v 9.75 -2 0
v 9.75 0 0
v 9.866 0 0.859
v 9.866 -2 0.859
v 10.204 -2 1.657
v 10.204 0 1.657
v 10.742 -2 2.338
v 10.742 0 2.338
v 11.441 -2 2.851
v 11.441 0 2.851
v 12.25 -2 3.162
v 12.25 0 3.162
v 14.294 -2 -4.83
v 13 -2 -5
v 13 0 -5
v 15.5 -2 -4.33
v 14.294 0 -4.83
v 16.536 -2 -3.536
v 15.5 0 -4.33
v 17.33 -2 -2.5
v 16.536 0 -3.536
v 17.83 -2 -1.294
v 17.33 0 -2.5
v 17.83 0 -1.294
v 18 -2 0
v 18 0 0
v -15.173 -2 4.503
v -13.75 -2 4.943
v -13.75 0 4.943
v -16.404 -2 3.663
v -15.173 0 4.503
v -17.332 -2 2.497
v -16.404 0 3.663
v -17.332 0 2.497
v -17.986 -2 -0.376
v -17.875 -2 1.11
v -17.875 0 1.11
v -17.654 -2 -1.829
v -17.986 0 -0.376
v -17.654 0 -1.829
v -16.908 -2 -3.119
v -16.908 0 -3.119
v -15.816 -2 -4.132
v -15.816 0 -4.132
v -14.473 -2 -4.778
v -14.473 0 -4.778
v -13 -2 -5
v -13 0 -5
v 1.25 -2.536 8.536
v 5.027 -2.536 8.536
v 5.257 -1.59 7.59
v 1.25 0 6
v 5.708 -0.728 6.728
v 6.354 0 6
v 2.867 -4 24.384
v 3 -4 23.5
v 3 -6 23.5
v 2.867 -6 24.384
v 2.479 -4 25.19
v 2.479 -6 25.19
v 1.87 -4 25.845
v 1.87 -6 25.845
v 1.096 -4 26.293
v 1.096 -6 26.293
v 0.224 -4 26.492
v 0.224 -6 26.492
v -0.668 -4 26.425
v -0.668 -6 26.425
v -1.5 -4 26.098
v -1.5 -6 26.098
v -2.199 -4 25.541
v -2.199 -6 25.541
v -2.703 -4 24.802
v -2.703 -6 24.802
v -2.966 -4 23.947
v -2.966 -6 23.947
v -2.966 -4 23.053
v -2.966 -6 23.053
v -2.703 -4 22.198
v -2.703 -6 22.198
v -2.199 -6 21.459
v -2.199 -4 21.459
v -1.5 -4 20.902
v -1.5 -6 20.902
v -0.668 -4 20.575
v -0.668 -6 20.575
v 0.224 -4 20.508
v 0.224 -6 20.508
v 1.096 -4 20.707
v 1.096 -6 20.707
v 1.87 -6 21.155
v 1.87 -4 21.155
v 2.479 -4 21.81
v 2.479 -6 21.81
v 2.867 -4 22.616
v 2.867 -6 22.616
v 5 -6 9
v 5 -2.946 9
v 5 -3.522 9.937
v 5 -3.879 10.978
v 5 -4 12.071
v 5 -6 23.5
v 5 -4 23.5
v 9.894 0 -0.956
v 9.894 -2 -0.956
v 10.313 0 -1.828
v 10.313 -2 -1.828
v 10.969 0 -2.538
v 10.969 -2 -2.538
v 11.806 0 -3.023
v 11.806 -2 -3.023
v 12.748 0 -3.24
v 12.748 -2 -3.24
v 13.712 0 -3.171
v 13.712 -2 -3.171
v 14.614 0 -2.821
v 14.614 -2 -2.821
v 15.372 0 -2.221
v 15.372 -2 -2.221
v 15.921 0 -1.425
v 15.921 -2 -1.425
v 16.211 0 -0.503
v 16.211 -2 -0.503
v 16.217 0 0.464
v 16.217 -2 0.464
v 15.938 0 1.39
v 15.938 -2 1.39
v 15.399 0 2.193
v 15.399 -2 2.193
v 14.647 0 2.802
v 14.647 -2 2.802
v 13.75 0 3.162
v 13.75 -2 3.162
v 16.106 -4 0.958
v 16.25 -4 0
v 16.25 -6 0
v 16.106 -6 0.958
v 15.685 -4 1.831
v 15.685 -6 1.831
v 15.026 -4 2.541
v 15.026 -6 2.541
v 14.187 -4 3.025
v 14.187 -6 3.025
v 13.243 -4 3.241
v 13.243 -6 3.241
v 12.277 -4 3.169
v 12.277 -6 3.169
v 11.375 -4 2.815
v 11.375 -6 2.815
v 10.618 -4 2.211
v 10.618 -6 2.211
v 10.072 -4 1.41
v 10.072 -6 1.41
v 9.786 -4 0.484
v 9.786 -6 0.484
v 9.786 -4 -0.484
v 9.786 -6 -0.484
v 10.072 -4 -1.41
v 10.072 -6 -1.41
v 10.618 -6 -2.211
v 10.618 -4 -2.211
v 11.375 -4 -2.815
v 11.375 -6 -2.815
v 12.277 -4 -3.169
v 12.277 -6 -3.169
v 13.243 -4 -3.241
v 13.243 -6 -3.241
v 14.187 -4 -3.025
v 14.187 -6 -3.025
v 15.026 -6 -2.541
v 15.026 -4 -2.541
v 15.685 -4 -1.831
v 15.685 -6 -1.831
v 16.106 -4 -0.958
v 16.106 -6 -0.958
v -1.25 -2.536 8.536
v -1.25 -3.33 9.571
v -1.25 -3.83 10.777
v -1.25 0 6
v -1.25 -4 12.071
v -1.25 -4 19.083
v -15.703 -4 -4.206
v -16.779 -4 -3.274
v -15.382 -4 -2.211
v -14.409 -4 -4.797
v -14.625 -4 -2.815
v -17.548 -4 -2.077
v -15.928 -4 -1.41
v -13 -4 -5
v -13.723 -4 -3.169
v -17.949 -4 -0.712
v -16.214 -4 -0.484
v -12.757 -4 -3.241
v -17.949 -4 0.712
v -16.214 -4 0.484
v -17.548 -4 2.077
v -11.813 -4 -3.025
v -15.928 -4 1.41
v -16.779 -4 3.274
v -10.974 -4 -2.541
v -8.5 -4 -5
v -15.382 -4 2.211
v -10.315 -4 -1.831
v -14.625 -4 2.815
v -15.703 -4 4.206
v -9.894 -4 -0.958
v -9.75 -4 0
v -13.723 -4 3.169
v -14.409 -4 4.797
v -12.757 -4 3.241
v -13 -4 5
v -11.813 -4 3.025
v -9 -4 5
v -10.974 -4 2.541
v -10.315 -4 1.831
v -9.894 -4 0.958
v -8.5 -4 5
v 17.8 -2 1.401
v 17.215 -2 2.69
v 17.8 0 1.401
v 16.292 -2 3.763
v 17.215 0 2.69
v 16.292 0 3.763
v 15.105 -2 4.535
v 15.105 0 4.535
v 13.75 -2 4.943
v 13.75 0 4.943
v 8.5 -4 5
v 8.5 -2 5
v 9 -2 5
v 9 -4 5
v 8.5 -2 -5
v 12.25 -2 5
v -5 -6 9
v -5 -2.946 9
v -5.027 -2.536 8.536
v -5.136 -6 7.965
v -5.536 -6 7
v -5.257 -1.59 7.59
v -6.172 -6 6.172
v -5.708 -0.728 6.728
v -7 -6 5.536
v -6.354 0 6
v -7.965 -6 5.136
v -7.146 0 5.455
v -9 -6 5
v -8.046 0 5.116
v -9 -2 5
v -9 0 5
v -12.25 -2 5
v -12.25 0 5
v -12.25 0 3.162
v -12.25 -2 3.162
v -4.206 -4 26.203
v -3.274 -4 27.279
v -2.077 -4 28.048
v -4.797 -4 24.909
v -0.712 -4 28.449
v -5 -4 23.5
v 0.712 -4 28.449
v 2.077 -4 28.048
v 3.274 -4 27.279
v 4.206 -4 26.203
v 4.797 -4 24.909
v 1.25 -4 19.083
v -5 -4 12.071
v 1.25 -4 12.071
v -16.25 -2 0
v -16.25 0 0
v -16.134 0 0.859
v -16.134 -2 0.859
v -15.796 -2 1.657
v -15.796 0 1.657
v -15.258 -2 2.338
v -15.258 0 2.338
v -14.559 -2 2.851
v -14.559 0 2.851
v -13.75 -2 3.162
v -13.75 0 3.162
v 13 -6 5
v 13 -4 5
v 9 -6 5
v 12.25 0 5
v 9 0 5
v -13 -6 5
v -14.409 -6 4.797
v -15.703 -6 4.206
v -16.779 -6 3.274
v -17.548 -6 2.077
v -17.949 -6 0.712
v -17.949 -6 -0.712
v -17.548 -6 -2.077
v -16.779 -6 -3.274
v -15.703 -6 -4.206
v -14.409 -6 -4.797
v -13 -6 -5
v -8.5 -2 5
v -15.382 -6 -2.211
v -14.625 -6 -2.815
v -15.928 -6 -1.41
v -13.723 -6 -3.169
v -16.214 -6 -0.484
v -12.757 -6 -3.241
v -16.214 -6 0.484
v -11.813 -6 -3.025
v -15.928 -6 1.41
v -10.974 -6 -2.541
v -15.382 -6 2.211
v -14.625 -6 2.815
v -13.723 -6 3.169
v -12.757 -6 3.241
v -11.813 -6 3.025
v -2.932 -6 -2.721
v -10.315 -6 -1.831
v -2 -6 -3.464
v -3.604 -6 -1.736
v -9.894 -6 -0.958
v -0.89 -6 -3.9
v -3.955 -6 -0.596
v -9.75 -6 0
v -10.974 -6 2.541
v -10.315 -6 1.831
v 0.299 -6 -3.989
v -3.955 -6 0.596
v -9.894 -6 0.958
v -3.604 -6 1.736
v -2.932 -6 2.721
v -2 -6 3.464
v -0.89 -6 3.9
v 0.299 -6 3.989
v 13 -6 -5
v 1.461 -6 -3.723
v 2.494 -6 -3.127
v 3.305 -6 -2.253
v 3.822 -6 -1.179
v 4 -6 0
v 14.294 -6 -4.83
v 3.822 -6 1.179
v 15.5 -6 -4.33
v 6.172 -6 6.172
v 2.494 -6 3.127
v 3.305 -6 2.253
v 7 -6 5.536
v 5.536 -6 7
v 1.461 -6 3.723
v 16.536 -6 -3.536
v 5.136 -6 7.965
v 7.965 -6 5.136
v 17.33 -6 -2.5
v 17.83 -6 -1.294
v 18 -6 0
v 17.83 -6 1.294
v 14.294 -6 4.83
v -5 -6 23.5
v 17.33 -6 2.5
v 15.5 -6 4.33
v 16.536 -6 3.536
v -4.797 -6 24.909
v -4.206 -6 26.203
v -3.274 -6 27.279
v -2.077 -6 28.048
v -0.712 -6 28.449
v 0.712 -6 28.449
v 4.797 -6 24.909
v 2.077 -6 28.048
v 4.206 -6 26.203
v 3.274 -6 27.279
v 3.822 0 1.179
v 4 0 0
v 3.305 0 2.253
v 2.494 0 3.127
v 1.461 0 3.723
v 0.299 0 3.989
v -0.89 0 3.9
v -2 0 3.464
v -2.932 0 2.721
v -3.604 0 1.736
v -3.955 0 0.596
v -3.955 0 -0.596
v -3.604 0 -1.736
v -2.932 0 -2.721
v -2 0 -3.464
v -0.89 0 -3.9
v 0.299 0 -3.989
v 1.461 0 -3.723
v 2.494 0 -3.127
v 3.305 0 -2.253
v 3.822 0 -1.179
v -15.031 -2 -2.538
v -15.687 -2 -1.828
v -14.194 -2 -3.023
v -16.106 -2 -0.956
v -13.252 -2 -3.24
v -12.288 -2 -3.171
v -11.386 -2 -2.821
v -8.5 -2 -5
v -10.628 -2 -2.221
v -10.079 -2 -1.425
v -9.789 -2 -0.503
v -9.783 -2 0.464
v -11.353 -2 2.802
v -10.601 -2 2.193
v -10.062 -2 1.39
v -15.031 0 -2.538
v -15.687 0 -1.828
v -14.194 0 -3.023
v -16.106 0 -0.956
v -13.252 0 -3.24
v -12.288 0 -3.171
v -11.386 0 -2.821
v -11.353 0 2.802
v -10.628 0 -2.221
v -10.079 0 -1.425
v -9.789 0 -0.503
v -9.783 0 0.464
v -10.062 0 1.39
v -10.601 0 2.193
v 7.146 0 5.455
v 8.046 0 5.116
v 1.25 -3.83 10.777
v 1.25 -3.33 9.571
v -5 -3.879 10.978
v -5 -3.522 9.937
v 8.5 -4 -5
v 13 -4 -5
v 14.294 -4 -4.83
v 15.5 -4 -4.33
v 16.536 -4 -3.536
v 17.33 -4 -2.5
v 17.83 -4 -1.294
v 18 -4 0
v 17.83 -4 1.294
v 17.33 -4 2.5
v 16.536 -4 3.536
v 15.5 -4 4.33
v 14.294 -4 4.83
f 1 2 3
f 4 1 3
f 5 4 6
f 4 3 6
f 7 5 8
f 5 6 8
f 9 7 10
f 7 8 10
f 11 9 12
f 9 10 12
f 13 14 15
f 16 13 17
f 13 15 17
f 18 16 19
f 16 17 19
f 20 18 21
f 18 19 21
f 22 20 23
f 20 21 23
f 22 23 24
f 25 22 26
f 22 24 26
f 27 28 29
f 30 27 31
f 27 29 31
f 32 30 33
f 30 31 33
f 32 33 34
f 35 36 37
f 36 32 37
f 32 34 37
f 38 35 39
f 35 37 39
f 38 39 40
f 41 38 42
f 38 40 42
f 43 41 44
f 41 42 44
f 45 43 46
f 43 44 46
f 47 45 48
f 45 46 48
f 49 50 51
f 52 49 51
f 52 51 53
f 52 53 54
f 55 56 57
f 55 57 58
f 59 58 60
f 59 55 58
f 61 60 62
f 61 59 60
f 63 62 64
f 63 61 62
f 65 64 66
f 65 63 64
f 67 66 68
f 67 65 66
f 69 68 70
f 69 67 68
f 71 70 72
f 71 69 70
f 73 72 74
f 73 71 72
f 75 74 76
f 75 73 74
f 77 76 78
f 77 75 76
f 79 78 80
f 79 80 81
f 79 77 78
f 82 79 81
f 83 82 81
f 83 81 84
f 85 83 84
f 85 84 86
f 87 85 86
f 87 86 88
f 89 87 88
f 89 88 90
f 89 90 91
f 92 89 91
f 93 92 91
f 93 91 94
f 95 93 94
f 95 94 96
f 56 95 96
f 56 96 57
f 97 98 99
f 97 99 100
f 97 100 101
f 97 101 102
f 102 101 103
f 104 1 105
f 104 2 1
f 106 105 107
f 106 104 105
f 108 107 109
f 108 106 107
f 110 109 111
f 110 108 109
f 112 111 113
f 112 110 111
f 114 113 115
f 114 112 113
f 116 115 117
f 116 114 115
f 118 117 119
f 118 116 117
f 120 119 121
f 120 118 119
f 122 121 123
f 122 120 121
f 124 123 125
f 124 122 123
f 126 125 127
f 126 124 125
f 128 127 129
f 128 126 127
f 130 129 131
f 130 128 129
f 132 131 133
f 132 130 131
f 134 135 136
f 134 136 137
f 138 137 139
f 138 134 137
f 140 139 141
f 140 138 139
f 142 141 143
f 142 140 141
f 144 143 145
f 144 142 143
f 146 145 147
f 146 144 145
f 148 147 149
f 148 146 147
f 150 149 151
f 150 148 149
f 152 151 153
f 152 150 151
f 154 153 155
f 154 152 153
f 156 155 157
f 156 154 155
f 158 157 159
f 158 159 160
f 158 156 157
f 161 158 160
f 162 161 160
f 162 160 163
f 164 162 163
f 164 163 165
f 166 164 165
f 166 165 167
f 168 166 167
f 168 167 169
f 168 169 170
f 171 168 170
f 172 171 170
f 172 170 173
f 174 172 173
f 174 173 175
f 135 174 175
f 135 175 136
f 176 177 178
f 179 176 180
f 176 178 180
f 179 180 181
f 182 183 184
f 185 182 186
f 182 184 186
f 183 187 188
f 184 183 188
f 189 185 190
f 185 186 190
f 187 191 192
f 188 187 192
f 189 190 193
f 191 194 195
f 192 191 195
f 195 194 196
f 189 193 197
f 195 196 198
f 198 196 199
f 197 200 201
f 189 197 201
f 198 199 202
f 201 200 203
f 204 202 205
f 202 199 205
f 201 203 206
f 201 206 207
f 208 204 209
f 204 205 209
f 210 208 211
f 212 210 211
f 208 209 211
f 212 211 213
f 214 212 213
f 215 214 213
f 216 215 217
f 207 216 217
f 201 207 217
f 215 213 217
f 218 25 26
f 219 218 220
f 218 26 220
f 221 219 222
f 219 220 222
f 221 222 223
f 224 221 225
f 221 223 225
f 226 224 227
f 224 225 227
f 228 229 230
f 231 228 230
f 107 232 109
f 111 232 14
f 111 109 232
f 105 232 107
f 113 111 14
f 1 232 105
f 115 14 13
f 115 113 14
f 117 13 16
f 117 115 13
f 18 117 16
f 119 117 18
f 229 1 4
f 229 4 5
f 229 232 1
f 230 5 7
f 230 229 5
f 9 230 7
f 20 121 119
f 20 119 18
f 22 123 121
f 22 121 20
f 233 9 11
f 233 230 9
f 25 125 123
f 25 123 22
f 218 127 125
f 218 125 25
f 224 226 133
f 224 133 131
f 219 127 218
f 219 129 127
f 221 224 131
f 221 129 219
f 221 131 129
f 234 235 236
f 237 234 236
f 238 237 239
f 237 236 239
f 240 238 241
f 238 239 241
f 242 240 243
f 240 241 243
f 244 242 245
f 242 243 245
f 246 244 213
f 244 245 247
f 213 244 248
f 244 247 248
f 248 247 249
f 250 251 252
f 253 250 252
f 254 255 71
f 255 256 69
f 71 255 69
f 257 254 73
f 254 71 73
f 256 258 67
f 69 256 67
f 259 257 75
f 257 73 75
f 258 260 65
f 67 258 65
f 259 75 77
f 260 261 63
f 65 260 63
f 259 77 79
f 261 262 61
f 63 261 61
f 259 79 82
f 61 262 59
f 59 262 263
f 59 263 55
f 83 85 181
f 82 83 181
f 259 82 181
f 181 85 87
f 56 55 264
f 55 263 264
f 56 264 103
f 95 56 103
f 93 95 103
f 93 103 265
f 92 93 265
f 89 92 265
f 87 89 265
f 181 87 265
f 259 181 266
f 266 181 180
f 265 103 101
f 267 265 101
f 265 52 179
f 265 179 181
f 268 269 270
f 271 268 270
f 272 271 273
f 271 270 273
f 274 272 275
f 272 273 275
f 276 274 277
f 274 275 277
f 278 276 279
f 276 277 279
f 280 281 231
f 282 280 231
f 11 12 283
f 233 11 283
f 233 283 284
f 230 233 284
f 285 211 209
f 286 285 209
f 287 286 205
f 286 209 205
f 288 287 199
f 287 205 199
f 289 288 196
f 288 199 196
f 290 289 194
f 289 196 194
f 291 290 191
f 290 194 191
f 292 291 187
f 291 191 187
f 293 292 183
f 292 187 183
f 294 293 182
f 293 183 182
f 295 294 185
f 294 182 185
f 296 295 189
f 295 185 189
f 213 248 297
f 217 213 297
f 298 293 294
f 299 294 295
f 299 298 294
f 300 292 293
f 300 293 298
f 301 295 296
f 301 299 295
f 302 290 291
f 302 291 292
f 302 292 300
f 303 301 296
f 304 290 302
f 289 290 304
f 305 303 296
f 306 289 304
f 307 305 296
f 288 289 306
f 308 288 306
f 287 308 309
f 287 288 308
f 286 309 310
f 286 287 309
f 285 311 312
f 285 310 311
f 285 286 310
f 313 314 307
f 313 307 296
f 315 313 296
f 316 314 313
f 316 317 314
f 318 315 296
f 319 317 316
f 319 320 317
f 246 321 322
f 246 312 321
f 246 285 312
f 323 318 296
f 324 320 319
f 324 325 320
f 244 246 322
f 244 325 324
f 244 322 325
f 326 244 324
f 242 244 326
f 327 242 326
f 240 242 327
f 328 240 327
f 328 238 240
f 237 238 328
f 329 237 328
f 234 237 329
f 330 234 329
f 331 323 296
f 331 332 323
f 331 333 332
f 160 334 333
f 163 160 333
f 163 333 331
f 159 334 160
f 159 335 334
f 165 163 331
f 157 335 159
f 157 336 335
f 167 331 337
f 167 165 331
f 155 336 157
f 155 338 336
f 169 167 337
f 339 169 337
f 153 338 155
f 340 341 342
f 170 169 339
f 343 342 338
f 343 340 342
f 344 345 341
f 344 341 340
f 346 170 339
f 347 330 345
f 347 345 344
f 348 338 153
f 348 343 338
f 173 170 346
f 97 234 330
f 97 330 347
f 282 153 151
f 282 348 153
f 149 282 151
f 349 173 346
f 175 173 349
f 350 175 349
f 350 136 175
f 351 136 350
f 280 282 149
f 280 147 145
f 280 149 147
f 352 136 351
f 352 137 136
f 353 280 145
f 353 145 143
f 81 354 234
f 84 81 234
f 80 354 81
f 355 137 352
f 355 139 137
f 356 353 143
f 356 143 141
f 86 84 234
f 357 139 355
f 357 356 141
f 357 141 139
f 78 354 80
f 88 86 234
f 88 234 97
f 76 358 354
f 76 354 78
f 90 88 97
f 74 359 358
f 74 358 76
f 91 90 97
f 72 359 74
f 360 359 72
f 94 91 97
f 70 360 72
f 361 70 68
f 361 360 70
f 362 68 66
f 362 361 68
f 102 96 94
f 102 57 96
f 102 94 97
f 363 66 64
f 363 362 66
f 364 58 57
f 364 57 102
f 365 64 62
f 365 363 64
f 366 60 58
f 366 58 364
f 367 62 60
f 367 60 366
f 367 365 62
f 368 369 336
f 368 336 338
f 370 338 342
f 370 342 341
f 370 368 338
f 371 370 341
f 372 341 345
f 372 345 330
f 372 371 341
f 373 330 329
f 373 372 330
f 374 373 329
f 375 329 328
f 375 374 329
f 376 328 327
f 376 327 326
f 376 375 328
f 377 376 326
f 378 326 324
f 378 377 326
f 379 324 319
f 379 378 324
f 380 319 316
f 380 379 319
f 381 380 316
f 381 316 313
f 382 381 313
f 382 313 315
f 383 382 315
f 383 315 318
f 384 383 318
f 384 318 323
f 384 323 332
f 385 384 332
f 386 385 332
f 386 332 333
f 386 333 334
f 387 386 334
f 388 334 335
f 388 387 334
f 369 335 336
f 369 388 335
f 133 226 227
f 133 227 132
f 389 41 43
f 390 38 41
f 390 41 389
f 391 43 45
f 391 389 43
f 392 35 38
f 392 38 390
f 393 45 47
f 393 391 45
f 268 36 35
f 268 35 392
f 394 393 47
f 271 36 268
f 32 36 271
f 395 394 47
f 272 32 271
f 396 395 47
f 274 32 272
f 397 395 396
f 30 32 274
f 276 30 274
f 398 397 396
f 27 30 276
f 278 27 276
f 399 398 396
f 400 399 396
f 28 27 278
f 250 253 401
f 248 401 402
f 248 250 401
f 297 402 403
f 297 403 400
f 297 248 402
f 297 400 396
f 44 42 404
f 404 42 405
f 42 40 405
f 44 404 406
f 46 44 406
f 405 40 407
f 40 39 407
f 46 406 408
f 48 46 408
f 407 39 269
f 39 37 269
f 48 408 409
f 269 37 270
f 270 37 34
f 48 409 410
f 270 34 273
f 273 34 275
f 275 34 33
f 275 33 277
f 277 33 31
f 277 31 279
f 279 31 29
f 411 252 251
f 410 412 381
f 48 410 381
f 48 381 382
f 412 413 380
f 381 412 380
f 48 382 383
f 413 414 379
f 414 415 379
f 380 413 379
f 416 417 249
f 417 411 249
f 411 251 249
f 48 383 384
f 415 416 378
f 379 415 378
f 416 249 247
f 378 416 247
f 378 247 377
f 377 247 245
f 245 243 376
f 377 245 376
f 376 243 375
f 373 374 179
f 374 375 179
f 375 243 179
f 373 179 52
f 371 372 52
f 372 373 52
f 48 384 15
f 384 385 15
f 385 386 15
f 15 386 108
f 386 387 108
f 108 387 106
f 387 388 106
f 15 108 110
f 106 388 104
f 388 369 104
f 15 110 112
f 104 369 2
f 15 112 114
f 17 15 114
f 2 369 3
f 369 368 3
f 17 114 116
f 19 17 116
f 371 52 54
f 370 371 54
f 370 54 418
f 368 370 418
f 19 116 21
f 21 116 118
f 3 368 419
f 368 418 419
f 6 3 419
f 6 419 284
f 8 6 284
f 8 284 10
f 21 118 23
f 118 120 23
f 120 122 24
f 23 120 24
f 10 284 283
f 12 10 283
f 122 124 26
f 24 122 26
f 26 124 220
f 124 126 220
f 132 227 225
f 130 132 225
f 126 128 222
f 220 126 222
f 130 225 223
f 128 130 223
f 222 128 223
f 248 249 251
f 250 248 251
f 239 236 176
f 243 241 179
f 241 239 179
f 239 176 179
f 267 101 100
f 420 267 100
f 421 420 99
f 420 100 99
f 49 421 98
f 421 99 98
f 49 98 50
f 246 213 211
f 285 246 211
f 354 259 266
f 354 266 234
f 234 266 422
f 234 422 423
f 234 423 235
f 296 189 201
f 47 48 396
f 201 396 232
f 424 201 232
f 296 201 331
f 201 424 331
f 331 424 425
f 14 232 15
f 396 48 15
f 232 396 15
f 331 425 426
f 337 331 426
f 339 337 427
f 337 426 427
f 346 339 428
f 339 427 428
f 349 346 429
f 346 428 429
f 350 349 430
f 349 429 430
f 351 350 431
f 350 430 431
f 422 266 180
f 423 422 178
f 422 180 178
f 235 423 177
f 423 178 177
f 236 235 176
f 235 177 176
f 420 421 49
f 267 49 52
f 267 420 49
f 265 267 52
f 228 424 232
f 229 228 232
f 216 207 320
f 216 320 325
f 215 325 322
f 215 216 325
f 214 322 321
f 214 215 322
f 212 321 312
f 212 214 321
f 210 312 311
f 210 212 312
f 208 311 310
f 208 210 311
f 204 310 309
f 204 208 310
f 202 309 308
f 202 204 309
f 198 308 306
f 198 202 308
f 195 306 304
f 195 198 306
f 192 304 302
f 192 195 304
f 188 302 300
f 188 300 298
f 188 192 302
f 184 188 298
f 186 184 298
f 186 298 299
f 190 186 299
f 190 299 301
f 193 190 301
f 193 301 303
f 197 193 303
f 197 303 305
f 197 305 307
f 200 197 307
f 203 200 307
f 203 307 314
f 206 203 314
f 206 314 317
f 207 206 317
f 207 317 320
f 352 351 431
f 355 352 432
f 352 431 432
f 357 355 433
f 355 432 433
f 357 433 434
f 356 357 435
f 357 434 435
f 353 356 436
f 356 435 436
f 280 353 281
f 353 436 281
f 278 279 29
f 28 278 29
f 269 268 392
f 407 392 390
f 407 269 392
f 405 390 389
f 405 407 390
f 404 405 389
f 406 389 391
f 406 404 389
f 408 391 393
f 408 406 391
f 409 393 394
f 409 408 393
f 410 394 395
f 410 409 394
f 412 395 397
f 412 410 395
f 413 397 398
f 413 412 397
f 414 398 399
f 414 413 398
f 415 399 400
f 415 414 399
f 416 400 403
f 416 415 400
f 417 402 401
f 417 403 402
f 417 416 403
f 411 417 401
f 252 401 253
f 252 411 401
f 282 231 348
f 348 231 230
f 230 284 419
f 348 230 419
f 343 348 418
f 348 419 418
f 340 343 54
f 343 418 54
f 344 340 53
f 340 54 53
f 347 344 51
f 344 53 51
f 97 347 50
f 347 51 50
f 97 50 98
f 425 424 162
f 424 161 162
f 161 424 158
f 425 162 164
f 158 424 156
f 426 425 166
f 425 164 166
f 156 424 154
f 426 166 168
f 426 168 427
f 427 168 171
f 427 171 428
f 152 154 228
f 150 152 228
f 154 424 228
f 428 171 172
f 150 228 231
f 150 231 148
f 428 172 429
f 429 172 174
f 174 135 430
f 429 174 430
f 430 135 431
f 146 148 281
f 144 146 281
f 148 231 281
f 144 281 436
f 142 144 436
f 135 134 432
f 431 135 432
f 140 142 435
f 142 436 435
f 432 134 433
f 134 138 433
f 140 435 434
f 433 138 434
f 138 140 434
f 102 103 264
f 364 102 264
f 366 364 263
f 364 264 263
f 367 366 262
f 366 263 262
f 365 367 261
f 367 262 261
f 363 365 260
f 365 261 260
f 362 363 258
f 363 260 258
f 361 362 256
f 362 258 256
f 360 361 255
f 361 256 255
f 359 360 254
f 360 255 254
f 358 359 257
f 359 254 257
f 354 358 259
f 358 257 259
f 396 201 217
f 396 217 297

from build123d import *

# Parameters (mm, degrees)
F0_R     = 4
F0_R_2   = 3
F0_R_3   = 3.25
F1_DEPTH = 6
F3_DEPTH = 12.5
F5_DEPTH = 1.25
F6_W     = 9.5
F6_H     = 2
F7_DEPTH = 25
F9_DEPTH = 2


with BuildPart() as f1:
    # F0 (on Front) → F1 (new body)
    with BuildSketch(Plane.XZ):
        with BuildLine():
            ThreePointArc((-13, 5), (-9.4644660941, 3.5355339059), (-8, 0))
            ThreePointArc((-8, 0), (-9.4644660941, -3.5355339059), (-13, -5))
            Line((-13, -5), (13, -5))
            ThreePointArc((13, -5), (8, 0), (13, 5))
            Line((13, 5), (9, 5))
            ThreePointArc((9, 5), (6.1715728753, 6.1715728753), (5, 9))
            Line((5, 9), (5, 23.5))
            ThreePointArc((5, 23.5), (0, 28.5), (-5, 23.5))
            Line((-5, 23.5), (-5, 9))
            ThreePointArc((-5, 9), (-6.1715728753, 6.1715728753), (-9, 5))
            Line((-9, 5), (-13, 5))
        make_face()
        Circle(F0_R, mode=Mode.SUBTRACT)
        with Locations((0, 23.5)):
            Circle(F0_R_2, mode=Mode.SUBTRACT)
        with BuildLine():
            ThreePointArc((-13, -5), (-9.4644660941, -3.5355339059), (-8, 0))
            ThreePointArc((-8, 0), (-9.4644660941, 3.5355339059), (-13, 5))
            ThreePointArc((-13, 5), (-18, 0), (-13, -5))
        make_face()
        with Locations((-13, 0)):
            Circle(F0_R_3, mode=Mode.SUBTRACT)
        with BuildLine():
            ThreePointArc((13, 5), (8, 0), (13, -5))
            ThreePointArc((13, -5), (16.5355339059, -3.5355339059), (18, 0))
            ThreePointArc((18, 0), (16.5355339059, 3.5355339059), (13, 5))
        make_face()
        with Locations((13, 0)):
            Circle(F0_R_3, mode=Mode.SUBTRACT)
    extrude(amount=F1_DEPTH)

    # F2 (on Right) → F3 (cut, symmetric)
    with BuildSketch(Plane.YZ):
        with BuildLine():
            Line((0, 28.5), (-4, 28.5))
            Line((-4, 28.5), (-4, 12.0710678119))
            ThreePointArc((-4, 12.0710678119), (-3.6193976626, 10.15765065), (-2.5355339059, 8.5355339059))
            Line((-2.5355339059, 8.5355339059), (0, 6))
            Line((0, 6), (0, 28.5))
        make_face()
    extrude(amount=F3_DEPTH, both=True, mode=Mode.SUBTRACT)

    # F4 (on Right) → F5 (join, symmetric)
    with BuildSketch(Plane.YZ):
        with BuildLine():
            Line((-2.5355339059, 8.5355339059), (0, 6))
            Line((0, 6), (-4, 19.0834104739))
            Line((-4, 19.0834104739), (-4, 12.0710678119))
            ThreePointArc((-4, 12.0710678119), (-3.6193976626, 10.15765065), (-2.5355339059, 8.5355339059))
        make_face()
    extrude(amount=F5_DEPTH, both=True)

    # F6 (on face) → F7 (cut)
    with BuildSketch(Plane.XY.offset(5)):
        with Locations((13.25, -3)):
            Rectangle(F6_W, F6_H)
        with Locations((-13.25, -3)):
            Rectangle(F6_W, F6_H)
    extrude(amount=-F7_DEPTH, mode=Mode.SUBTRACT)

    # F8 (on face) → F9 (cut)
    with BuildSketch(Plane(origin=(0, 0, 0), x_dir=(-1, 0, 0), z_dir=(0, 1, 0))):
        with BuildLine():
            Line((13.75, 6.816144567), (12.25, 6.816144567))
            Line((12.25, 6.816144567), (12.25, 3.1622776602))
            ThreePointArc((12.25, 3.1622776602), (13, 3.25), (13.75, 3.1622776602))
            Line((13.75, 3.1622776602), (13.75, 6.816144567))
        make_face()
        with BuildLine():
            ThreePointArc((13.75, 3.1622776602), (13, 3.25), (12.25, 3.1622776602))
            Line((12.25, 3.1622776602), (12.25, 1.0694904486))
            Line((12.25, 1.0694904486), (13.75, 1.0694904486))
            Line((13.75, 1.0694904486), (13.75, 3.1622776602))
        make_face()
        with BuildLine():
            Line((12.25, 1.0694904486), (12.25, 3.1622776602))
            ThreePointArc((12.25, 3.1622776602), (10.9844355629, -2.5495097568), (16.25, 0))
            ThreePointArc((16.25, 0), (15.5495097568, 2.0155644371), (13.75, 3.1622776602))
            Line((13.75, 3.1622776602), (13.75, 1.0694904486))
            Line((13.75, 1.0694904486), (12.25, 1.0694904486))
        make_face()
        with BuildLine():
            ThreePointArc((-13.75, 3.1622776602), (-15.0155644371, -2.5495097568), (-9.75, 0))
            ThreePointArc((-9.75, 0), (-10.4504902432, 2.0155644371), (-12.25, 3.1622776602))
            Line((-12.25, 3.1622776602), (-12.25, 1.0694904486))
            Line((-12.25, 1.0694904486), (-13.75, 1.0694904486))
            Line((-13.75, 1.0694904486), (-13.75, 3.1622776602))
        make_face()
        with BuildLine():
            Line((-12.25, 1.0694904486), (-12.25, 3.1622776602))
            ThreePointArc((-12.25, 3.1622776602), (-13, 3.25), (-13.75, 3.1622776602))
            Line((-13.75, 3.1622776602), (-13.75, 1.0694904486))
            Line((-13.75, 1.0694904486), (-12.25, 1.0694904486))
        make_face()
        with BuildLine():
            ThreePointArc((-13.75, 3.1622776602), (-13, 3.25), (-12.25, 3.1622776602))
            Line((-12.25, 3.1622776602), (-12.25, 6.816144567))
            Line((-12.25, 6.816144567), (-13.75, 6.816144567))
            Line((-13.75, 6.816144567), (-13.75, 3.1622776602))
        make_face()
        with BuildLine():
            ThreePointArc((-12.25, 3.1622776602), (-13, 3.25), (-13.75, 3.1622776602))
            Line((-13.75, 3.1622776602), (-13.75, 1.0694904486))
            Line((-13.75, 1.0694904486), (-12.25, 1.0694904486))
            Line((-12.25, 1.0694904486), (-12.25, 3.1622776602))
        make_face()
        with BuildLine():
            Line((-13.75, 1.0694904486), (-13.75, 3.1622776602))
            ThreePointArc((-13.75, 3.1622776602), (-15.0155644371, -2.5495097568), (-9.75, 0))
            ThreePointArc((-9.75, 0), (-10.4504902432, 2.0155644371), (-12.25, 3.1622776602))
            Line((-12.25, 3.1622776602), (-12.25, 1.0694904486))
            Line((-12.25, 1.0694904486), (-13.75, 1.0694904486))
        make_face()
    extrude(amount=-F9_DEPTH, mode=Mode.SUBTRACT)


solid = f1.part
